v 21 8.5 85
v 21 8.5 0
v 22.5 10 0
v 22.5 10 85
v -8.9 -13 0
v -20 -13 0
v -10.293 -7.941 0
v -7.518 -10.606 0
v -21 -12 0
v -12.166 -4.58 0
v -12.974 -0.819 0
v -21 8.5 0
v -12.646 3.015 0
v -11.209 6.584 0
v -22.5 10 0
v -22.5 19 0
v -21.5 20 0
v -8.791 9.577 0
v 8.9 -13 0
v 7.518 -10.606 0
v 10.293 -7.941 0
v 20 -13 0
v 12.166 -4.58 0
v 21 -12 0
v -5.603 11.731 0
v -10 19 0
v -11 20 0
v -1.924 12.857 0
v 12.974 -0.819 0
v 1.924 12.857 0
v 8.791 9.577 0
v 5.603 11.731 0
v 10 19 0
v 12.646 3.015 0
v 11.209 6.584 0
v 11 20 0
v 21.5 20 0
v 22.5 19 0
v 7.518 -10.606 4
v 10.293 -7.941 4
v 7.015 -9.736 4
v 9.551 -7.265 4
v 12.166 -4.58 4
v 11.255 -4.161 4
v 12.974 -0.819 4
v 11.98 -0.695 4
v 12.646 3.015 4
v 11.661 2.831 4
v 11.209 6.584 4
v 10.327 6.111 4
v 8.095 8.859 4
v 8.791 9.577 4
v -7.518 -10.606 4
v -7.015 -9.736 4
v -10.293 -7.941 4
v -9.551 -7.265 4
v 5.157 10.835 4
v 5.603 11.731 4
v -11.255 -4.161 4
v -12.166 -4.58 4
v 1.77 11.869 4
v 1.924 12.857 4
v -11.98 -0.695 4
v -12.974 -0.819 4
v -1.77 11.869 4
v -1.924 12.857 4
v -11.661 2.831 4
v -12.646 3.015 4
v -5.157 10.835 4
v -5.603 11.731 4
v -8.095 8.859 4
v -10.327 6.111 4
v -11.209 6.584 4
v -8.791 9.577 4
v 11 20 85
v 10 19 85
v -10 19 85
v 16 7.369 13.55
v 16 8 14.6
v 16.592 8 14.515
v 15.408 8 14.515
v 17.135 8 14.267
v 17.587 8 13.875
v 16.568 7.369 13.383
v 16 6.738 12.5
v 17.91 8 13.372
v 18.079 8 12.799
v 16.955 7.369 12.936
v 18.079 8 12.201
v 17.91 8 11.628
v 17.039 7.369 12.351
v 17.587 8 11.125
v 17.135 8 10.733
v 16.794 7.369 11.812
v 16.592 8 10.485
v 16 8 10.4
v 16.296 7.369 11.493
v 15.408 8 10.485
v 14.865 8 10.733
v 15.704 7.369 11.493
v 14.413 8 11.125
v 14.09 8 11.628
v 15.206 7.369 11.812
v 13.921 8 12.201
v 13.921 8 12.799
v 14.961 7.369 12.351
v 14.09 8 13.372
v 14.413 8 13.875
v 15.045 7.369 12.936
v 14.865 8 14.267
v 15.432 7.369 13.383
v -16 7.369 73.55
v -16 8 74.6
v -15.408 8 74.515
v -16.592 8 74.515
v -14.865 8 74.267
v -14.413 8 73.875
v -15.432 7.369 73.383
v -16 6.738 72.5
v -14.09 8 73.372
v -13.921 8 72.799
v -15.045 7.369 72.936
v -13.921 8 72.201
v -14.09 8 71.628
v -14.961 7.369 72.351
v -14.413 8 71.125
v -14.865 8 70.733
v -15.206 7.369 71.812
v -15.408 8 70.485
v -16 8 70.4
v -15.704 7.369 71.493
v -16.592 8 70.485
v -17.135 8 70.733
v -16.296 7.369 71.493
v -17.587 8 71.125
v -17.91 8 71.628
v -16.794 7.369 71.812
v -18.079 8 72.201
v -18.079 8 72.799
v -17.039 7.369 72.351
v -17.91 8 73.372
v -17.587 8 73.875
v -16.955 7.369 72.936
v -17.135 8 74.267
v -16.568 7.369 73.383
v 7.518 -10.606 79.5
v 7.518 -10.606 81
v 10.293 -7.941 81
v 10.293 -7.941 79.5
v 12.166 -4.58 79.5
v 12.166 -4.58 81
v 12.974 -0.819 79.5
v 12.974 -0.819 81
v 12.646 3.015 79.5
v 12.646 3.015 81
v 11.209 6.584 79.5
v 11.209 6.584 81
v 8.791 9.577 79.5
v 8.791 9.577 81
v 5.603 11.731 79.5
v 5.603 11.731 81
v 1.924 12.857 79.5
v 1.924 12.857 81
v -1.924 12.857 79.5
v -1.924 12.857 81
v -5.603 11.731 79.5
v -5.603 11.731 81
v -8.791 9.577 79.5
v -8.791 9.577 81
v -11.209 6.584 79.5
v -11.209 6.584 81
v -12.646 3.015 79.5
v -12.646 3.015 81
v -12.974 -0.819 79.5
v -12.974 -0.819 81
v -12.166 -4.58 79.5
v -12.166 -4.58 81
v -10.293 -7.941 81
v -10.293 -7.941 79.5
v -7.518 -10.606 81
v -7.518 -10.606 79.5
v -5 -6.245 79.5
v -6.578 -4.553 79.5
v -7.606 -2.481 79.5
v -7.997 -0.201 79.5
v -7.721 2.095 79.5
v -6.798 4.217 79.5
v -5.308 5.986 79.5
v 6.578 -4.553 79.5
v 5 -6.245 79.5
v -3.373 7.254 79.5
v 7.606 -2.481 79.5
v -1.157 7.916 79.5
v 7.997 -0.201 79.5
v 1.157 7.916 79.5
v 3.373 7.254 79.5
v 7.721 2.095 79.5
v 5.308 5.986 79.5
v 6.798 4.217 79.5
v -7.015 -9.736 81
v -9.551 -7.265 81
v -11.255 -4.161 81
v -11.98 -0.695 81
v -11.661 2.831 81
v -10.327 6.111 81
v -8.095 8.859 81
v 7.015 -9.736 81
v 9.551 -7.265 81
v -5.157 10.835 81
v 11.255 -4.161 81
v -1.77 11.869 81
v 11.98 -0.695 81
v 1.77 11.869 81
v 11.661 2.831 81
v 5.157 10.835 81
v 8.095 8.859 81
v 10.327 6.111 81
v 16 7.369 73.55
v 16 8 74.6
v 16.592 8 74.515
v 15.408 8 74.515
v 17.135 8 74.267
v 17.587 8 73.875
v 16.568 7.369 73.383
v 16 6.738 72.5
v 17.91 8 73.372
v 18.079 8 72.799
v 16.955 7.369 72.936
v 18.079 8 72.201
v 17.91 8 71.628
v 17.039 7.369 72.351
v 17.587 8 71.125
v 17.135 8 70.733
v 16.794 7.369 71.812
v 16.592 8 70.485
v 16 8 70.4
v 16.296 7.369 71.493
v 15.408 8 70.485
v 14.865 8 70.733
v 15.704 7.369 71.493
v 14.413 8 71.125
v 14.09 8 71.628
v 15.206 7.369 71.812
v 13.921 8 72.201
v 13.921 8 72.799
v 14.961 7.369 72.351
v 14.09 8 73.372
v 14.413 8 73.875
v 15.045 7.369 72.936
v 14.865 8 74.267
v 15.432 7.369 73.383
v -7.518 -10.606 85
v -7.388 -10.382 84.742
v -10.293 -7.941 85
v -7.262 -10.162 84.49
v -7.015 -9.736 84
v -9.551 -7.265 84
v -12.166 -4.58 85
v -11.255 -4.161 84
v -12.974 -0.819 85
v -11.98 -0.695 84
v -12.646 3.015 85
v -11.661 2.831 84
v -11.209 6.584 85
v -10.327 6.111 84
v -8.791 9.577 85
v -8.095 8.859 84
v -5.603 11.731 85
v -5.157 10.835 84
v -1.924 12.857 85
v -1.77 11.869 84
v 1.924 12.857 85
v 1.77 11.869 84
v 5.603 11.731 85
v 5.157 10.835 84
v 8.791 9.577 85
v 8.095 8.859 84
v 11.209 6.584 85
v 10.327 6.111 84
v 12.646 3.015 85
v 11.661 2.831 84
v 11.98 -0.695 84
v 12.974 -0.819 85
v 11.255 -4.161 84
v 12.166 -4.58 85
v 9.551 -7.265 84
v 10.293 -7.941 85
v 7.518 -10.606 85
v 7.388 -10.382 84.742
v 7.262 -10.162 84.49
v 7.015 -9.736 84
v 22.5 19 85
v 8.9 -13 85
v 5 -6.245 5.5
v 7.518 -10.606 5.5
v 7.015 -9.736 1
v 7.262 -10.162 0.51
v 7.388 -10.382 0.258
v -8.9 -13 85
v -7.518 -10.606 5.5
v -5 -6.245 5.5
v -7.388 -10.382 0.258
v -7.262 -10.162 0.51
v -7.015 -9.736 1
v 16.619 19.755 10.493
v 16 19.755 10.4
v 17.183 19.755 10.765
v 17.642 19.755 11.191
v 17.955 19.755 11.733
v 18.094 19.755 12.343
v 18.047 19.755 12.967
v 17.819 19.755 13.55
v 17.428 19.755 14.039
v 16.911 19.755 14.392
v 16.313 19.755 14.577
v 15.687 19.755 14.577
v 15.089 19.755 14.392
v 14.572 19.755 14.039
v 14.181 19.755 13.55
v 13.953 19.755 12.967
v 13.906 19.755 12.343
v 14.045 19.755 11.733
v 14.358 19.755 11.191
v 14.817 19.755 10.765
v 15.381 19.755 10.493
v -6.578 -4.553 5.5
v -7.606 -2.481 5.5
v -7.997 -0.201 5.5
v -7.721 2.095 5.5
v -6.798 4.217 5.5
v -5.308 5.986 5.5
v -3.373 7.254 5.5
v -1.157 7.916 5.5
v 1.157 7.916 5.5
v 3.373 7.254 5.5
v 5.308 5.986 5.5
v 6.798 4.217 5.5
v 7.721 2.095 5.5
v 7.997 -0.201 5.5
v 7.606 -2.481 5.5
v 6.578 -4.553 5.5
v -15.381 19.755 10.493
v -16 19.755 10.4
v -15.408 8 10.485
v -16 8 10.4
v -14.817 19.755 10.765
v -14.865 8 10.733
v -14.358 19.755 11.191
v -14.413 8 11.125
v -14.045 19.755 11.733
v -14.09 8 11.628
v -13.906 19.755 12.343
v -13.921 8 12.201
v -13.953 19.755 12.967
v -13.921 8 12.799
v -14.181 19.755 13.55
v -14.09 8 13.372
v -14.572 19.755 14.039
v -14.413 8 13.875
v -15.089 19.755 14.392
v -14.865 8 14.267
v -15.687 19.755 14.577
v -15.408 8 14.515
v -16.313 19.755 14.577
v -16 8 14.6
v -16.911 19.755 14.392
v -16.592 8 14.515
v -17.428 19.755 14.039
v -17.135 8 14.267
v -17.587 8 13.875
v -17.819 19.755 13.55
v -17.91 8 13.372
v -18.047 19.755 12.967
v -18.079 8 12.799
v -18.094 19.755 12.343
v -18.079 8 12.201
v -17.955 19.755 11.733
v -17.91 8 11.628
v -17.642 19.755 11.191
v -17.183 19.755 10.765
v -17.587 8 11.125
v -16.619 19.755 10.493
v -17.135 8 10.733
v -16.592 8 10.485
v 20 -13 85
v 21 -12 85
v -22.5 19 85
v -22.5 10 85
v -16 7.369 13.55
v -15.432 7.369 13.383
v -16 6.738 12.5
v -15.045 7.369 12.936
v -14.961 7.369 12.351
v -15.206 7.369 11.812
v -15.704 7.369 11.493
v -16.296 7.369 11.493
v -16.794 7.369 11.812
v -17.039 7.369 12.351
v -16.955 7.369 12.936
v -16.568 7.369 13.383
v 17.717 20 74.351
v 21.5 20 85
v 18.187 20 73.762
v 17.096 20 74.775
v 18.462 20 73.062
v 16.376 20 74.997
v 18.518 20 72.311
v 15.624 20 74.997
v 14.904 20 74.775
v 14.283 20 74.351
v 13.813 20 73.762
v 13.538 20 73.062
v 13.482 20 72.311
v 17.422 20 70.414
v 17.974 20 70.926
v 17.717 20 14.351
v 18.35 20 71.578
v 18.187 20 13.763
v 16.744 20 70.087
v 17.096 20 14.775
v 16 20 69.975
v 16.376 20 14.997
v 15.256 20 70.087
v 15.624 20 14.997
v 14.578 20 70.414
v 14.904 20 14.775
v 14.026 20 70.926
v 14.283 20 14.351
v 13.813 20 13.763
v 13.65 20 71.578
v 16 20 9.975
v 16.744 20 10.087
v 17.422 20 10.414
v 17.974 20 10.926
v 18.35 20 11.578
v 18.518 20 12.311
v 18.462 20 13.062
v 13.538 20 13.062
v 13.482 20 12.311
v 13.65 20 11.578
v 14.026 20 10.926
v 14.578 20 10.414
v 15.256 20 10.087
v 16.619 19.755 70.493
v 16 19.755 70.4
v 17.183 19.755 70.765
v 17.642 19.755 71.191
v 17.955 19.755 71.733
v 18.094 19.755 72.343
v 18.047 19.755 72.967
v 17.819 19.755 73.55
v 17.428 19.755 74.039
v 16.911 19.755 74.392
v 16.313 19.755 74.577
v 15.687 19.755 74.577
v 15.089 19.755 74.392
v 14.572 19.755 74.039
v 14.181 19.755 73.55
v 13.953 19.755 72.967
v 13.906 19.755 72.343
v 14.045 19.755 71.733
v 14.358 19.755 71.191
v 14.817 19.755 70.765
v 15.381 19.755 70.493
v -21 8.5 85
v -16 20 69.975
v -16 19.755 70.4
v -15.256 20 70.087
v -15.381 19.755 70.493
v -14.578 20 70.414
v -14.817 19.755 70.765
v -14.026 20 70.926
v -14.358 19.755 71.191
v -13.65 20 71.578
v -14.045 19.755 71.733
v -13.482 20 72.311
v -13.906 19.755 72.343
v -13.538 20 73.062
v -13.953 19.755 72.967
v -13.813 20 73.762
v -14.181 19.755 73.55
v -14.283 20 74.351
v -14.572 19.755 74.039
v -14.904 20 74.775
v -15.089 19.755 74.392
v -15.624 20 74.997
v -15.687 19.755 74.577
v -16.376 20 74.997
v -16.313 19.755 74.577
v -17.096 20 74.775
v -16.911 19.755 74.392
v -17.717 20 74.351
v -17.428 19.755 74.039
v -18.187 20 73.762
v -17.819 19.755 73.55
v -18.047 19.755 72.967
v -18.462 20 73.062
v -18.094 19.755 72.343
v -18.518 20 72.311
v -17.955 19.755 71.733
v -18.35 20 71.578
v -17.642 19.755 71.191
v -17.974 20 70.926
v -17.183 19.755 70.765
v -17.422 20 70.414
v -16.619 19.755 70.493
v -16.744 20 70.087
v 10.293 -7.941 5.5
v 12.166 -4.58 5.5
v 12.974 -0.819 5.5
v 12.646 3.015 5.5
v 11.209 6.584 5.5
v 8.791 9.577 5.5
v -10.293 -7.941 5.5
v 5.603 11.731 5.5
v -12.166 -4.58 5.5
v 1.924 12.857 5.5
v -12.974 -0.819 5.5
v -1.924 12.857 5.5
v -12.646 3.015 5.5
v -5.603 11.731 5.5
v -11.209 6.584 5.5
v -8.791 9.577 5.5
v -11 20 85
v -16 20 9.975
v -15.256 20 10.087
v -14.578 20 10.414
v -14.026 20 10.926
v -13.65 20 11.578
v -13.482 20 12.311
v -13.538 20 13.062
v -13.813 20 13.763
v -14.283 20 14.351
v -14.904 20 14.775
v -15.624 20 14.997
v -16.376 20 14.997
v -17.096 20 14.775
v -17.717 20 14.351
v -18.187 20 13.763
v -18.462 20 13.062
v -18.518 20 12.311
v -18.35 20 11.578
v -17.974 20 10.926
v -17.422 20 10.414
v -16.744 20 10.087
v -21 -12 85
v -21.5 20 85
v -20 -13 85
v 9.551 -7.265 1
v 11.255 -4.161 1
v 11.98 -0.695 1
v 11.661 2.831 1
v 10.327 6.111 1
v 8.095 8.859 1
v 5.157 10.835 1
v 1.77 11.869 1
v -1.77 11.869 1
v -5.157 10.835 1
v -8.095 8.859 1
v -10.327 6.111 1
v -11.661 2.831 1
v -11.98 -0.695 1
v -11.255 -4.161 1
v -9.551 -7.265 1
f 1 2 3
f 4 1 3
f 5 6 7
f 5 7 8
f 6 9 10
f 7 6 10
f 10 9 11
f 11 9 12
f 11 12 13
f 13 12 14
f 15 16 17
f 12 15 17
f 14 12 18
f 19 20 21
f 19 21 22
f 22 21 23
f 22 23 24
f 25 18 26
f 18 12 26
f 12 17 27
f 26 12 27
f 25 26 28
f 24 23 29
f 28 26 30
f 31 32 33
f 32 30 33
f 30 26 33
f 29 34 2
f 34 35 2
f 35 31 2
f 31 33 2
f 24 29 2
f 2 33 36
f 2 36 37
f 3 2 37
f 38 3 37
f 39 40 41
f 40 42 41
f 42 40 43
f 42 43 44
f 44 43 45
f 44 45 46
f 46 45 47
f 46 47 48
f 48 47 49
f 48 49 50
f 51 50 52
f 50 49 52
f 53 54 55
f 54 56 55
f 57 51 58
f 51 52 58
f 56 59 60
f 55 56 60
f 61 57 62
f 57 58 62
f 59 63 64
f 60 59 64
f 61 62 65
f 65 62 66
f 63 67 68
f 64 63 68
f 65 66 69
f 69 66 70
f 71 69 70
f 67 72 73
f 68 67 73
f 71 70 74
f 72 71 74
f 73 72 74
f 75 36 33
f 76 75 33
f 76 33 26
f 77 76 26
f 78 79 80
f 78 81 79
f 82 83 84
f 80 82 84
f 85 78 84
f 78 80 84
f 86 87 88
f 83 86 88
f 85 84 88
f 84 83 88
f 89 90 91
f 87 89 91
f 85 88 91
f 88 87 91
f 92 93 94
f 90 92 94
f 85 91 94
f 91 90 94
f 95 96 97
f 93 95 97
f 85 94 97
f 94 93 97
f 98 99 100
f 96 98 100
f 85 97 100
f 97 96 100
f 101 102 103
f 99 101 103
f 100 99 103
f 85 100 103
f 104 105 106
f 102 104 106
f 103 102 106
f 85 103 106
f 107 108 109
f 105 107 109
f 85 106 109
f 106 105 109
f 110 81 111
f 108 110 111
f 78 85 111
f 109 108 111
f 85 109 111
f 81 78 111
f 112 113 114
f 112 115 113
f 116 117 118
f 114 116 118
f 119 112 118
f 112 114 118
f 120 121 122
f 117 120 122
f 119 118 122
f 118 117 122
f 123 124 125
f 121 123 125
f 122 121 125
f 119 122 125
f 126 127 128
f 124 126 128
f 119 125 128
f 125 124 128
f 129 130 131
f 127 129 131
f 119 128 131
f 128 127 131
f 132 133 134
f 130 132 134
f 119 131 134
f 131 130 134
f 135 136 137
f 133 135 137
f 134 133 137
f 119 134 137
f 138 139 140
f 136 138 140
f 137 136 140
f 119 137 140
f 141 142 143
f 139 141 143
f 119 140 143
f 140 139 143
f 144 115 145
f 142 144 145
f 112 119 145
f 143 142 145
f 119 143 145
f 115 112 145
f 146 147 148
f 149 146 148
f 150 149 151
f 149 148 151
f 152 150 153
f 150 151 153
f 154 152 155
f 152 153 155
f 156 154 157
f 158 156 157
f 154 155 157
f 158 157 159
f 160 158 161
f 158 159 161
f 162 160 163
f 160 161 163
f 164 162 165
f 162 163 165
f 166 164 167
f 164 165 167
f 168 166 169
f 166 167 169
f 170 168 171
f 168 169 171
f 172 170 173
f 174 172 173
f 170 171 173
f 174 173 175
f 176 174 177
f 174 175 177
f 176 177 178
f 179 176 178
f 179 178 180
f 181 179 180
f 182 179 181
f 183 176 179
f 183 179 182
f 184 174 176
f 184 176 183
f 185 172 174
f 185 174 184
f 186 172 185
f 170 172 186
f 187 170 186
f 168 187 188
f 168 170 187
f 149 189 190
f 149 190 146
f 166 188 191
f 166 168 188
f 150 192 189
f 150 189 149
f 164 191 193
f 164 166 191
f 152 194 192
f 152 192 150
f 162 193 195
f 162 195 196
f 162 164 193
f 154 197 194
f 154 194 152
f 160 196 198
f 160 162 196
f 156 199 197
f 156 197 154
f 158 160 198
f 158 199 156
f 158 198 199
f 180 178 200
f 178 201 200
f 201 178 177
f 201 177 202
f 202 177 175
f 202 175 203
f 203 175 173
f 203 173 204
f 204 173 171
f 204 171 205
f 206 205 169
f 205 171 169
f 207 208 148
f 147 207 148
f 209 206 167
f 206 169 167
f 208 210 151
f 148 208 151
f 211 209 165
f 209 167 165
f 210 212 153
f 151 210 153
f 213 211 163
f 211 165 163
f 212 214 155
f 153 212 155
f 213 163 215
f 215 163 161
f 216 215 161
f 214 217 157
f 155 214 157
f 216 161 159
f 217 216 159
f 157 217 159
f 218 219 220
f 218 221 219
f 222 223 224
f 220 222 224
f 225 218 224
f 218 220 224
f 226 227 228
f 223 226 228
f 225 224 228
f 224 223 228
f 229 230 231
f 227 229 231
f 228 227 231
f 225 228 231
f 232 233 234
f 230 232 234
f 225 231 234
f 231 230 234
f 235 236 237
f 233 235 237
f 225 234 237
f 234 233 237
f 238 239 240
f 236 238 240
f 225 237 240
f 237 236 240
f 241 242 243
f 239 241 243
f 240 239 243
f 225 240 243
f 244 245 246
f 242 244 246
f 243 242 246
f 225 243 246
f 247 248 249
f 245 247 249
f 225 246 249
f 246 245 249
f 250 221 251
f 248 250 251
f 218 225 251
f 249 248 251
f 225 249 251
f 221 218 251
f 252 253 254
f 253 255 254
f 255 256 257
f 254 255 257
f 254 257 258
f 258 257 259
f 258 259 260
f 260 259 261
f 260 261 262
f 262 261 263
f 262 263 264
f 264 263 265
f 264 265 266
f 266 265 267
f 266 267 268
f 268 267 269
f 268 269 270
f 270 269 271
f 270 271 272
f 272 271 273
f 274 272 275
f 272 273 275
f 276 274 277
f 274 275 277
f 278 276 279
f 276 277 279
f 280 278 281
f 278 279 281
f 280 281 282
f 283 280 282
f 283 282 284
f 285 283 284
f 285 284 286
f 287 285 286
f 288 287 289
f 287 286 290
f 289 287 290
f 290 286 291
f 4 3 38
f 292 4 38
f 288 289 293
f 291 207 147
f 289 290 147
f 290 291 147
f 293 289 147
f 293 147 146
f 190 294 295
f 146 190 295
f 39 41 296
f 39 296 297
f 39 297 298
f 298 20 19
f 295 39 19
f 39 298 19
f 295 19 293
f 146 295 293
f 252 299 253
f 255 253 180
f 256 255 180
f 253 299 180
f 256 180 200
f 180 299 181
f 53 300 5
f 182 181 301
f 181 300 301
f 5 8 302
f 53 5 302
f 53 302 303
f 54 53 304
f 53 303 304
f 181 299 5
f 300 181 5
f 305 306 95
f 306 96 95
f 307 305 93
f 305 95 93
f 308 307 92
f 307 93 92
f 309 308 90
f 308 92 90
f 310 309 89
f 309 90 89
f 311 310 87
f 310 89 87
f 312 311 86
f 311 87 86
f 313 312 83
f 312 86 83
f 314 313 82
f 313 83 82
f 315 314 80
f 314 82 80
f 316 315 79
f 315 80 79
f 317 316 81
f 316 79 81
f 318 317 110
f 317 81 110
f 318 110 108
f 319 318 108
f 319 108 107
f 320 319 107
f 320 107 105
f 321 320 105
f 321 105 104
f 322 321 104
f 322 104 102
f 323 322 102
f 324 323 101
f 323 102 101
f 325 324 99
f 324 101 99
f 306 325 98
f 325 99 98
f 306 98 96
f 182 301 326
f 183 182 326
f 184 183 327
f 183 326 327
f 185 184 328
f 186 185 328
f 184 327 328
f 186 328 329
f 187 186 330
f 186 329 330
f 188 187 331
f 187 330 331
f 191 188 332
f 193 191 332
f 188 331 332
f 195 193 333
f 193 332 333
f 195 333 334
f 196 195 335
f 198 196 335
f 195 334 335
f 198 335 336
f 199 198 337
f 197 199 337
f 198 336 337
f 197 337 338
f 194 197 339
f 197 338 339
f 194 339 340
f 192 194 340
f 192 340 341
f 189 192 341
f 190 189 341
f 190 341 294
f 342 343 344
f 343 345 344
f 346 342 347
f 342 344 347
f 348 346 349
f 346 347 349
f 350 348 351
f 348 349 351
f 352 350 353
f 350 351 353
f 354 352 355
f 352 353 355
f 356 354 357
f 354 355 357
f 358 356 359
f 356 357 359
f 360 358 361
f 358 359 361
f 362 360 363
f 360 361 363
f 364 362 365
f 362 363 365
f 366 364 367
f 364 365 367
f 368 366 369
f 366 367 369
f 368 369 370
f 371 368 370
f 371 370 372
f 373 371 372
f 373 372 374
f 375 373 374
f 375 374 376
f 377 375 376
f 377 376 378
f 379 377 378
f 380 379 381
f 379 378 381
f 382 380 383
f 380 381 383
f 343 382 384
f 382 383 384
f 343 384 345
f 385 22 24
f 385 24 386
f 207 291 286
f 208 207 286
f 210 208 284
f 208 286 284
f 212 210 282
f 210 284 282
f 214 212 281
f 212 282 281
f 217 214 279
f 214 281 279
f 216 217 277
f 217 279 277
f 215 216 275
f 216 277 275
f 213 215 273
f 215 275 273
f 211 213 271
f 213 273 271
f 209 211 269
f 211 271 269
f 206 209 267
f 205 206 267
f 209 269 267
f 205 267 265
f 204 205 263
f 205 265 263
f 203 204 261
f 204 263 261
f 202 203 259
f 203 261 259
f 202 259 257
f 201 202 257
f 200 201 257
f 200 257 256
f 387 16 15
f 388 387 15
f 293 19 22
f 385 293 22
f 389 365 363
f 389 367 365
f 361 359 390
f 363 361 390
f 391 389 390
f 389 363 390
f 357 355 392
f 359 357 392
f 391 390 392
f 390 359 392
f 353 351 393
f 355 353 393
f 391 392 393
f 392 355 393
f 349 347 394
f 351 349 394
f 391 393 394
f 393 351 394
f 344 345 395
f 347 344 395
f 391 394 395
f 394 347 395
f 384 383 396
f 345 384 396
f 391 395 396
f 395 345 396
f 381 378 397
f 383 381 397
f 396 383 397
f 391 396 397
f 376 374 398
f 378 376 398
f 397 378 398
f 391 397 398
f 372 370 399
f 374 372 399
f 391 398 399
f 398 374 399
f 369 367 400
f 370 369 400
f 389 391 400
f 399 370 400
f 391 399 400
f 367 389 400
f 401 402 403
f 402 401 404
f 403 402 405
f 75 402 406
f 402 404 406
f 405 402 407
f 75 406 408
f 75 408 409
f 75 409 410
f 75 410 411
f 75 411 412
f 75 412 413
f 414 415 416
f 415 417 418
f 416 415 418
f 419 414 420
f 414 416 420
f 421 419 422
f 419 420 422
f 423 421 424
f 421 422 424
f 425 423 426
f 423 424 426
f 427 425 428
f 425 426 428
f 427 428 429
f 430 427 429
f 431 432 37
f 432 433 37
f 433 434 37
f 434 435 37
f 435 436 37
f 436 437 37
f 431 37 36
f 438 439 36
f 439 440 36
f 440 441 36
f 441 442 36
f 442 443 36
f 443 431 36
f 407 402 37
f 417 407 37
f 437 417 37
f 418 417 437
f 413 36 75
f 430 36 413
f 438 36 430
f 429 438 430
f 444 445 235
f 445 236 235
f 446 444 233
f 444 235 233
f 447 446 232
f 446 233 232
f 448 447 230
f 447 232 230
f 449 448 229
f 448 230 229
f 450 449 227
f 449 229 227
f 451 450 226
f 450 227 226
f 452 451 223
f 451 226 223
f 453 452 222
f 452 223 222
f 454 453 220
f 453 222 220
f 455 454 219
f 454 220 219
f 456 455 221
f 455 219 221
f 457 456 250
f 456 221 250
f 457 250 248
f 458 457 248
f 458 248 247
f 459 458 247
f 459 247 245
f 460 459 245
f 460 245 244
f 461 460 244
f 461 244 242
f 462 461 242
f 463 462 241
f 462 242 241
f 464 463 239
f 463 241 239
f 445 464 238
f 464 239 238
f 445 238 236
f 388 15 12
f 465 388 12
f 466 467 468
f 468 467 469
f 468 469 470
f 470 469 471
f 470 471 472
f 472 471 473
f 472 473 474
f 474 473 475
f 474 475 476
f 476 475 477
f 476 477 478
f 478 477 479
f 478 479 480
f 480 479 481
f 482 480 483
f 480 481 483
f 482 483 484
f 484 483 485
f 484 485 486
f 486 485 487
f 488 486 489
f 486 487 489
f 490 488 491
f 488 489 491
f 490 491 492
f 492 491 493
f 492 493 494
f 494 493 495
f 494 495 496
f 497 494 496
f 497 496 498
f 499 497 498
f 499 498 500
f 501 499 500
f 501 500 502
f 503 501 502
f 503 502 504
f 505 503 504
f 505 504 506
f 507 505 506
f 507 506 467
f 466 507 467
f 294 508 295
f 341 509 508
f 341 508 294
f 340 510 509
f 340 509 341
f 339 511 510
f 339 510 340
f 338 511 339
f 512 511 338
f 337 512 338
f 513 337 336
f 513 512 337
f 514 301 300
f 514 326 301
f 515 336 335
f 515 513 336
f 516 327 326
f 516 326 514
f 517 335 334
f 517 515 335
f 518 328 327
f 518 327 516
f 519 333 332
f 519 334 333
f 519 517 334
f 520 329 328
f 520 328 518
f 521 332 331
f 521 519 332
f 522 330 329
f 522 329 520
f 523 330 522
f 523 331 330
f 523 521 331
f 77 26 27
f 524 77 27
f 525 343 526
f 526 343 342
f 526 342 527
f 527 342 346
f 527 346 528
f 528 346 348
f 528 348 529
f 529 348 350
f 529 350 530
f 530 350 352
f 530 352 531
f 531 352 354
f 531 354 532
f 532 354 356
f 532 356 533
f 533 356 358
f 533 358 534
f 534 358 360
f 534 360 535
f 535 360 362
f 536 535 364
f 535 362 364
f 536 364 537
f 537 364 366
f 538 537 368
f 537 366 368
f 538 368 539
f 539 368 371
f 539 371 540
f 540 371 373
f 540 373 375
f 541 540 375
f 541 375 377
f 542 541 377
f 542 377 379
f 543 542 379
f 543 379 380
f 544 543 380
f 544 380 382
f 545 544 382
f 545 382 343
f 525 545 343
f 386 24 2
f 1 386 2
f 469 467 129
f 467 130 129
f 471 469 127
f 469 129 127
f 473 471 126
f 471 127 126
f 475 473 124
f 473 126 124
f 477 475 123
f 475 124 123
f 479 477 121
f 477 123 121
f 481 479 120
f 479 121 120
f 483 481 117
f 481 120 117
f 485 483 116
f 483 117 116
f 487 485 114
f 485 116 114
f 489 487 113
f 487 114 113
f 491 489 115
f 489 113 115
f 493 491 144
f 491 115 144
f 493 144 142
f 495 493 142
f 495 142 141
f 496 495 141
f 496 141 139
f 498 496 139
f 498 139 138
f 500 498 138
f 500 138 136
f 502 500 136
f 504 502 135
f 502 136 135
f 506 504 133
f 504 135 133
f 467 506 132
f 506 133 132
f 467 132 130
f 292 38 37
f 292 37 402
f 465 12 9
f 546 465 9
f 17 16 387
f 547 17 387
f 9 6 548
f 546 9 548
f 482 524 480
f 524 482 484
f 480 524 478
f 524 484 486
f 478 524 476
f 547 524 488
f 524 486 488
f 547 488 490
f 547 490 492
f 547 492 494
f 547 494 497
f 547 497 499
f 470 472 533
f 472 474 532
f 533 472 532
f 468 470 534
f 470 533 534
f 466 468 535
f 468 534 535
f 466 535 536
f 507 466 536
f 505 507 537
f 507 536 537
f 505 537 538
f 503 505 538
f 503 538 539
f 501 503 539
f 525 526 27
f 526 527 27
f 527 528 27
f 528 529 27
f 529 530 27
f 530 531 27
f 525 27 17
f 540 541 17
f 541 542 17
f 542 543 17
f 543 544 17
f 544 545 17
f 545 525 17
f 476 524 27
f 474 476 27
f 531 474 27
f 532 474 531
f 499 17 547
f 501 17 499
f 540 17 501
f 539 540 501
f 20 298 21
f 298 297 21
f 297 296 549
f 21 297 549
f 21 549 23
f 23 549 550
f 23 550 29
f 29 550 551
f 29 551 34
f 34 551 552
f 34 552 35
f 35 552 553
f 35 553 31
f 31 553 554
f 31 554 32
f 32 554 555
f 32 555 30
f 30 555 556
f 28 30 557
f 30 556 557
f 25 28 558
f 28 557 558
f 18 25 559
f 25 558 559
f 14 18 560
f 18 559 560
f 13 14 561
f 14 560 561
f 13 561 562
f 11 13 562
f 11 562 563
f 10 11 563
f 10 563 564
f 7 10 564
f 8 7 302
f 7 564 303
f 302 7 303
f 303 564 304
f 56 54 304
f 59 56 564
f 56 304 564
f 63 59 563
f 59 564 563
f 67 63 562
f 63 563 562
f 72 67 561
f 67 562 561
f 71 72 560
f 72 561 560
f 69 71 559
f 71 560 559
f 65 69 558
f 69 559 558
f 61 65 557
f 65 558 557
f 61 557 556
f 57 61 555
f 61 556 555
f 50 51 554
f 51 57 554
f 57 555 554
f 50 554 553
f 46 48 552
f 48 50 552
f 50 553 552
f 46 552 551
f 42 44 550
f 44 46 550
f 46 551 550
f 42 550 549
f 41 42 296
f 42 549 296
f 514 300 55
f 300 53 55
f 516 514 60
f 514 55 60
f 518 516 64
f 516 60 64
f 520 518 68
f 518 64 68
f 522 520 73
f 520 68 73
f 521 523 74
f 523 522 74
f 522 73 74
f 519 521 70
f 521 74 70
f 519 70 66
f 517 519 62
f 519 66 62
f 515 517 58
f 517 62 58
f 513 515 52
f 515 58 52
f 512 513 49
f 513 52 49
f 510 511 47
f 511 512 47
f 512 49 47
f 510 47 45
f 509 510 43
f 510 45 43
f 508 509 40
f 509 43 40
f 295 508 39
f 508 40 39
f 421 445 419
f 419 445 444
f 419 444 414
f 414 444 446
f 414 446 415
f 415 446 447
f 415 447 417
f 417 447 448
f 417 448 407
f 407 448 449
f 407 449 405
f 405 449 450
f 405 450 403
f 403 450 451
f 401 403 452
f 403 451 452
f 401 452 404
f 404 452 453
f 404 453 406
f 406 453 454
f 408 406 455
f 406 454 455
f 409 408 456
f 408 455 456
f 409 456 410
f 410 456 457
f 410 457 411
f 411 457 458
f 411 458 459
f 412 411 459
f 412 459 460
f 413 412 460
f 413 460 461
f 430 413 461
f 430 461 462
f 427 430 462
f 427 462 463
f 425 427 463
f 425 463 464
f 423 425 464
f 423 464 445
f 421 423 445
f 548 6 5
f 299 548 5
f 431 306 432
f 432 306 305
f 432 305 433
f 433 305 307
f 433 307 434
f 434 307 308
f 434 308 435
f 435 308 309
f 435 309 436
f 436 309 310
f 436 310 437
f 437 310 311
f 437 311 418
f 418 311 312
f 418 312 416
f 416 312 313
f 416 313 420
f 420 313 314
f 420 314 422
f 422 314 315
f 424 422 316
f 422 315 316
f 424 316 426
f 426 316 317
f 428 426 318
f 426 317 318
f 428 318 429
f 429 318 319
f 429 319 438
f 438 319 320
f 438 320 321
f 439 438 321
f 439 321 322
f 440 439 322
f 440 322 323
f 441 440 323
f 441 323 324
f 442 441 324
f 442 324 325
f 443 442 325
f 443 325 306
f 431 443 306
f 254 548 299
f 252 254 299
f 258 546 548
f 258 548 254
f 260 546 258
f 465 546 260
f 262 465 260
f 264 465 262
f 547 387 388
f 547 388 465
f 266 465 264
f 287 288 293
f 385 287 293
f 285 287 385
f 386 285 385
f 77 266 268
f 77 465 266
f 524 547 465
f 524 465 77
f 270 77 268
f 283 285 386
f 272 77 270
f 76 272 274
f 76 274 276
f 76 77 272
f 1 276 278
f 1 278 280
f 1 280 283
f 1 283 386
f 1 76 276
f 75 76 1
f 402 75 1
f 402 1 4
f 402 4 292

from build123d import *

# Parameters (mm, degrees)
BOSS_EXTRUDE1_DEPTH         = 85
CHAMFER2_SIZE               = 1
CHAMFER3_SIZE               = 1
M5_TAPPED_HOLE1_D           = 4.2
M5_TAPPED_HOLE1_DEPTH       = 12
M5_TAPPED_HOLE1_CSINK_D     = 5.05
M5_TAPPED_HOLE1_CSINK_ANGLE = 120
M5_TAPPED_HOLE1_TIP         = 1.2618073
SKETCH6_R                   = 12
CUT_EXTRUDE1_DEPTH          = 4
SKETCH7_R                   = 12
CUT_EXTRUDE2_DEPTH          = 4
CHAMFER5_SIZE               = 1
SKETCH12_R                  = 13
CUT_EXTRUDE7_DEPTH          = 1.5
SKETCH13_R                  = 13
CUT_EXTRUDE8_DEPTH          = 1.5


with BuildPart() as part:
    # Sketch1 → Boss-Extrude1 (new body)
    with BuildSketch(Plane.XY):
        with BuildLine():
            Line((10, 19), (-10, 19))
            Line((-10, 19), (-11, 20))
            Line((-11, 20), (-22.5, 20))
            Line((-22.5, 20), (-22.5, 10))
            Line((-22.5, 10), (-21, 8.5))
            Line((-21, 8.5), (-21, -13))
            Line((-21, -13), (-8.9, -13))
            Line((-8.9, -13), (-4.999998479, -6.244999216))
            ThreePointArc((-4.999998479, -6.244999216), (0, 8), (4.999998479, -6.244999216))
            Line((4.999998479, -6.244999216), (8.9, -13))
            Line((8.9, -13), (21, -13))
            Line((21, -13), (21, 8.5))
            Line((21, 8.5), (22.5, 10))
            Line((22.5, 10), (22.5, 20))
            Line((22.5, 20), (11, 20))
            Line((11, 20), (10, 19))
        make_face()
    extrude(amount=BOSS_EXTRUDE1_DEPTH)

    # Chamfer2
    chamfer2_edges = [part.edges().sort_by_distance(p)[0] for p in [
        (-22.5, 20, 42.5),
    ]]
    chamfer(chamfer2_edges, length=CHAMFER2_SIZE)

    # Chamfer3
    chamfer3_edges = [part.edges().sort_by_distance(p)[0] for p in [
        (-21, -13, 42.5),
        (22.5, 20, 42.5),
        (21, -13, 42.5),
    ]]
    chamfer(chamfer3_edges, length=CHAMFER3_SIZE)

    # M5 Tapped Hole1
    with Locations(Plane(origin=(-16, 20, 12.5), x_dir=(0, 0, 1), z_dir=(0, 1, 0))):
        with Locations((0, 0), (0, 32), (60, 0), (60, 32)):
            CounterSinkHole(M5_TAPPED_HOLE1_D / 2, M5_TAPPED_HOLE1_CSINK_D / 2, depth=M5_TAPPED_HOLE1_DEPTH, counter_sink_angle=M5_TAPPED_HOLE1_CSINK_ANGLE)
            with Locations((0, 0, -(M5_TAPPED_HOLE1_DEPTH + M5_TAPPED_HOLE1_TIP / 2))):  # 118° drill point
                Cone(0, M5_TAPPED_HOLE1_D / 2, M5_TAPPED_HOLE1_TIP, mode=Mode.SUBTRACT)

    # Sketch6 → Cut-Extrude1 (cut)
    with BuildSketch(Plane.XY.offset(85)):
        Circle(SKETCH6_R)
    extrude(amount=-CUT_EXTRUDE1_DEPTH, mode=Mode.SUBTRACT)

    # Sketch7 → Cut-Extrude2 (cut)
    with BuildSketch(Plane(origin=(0, 0, 0), x_dir=(-1, 0, 0), z_dir=(0, 0, -1))):
        Circle(SKETCH7_R)
    extrude(amount=-CUT_EXTRUDE2_DEPTH, mode=Mode.SUBTRACT)

    # Chamfer5
    chamfer5_edges = [part.edges().sort_by_distance(p)[0] for p in [
        (0, 12, 0),
        (0, 12, 85),
    ]]
    chamfer(chamfer5_edges, length=CHAMFER5_SIZE)

    # Sketch12 → Cut-Extrude7 (cut)
    with BuildSketch(Plane.XY.offset(81)):
        Circle(SKETCH12_R)
    extrude(amount=-CUT_EXTRUDE7_DEPTH, mode=Mode.SUBTRACT)

    # Sketch13 → Cut-Extrude8 (cut)
    with BuildSketch(Plane(origin=(0, 0, 4), x_dir=(-1, 0, 0), z_dir=(0, 0, -1))):
        Circle(SKETCH13_R)
    extrude(amount=-CUT_EXTRUDE8_DEPTH, mode=Mode.SUBTRACT)


solid = part.part
